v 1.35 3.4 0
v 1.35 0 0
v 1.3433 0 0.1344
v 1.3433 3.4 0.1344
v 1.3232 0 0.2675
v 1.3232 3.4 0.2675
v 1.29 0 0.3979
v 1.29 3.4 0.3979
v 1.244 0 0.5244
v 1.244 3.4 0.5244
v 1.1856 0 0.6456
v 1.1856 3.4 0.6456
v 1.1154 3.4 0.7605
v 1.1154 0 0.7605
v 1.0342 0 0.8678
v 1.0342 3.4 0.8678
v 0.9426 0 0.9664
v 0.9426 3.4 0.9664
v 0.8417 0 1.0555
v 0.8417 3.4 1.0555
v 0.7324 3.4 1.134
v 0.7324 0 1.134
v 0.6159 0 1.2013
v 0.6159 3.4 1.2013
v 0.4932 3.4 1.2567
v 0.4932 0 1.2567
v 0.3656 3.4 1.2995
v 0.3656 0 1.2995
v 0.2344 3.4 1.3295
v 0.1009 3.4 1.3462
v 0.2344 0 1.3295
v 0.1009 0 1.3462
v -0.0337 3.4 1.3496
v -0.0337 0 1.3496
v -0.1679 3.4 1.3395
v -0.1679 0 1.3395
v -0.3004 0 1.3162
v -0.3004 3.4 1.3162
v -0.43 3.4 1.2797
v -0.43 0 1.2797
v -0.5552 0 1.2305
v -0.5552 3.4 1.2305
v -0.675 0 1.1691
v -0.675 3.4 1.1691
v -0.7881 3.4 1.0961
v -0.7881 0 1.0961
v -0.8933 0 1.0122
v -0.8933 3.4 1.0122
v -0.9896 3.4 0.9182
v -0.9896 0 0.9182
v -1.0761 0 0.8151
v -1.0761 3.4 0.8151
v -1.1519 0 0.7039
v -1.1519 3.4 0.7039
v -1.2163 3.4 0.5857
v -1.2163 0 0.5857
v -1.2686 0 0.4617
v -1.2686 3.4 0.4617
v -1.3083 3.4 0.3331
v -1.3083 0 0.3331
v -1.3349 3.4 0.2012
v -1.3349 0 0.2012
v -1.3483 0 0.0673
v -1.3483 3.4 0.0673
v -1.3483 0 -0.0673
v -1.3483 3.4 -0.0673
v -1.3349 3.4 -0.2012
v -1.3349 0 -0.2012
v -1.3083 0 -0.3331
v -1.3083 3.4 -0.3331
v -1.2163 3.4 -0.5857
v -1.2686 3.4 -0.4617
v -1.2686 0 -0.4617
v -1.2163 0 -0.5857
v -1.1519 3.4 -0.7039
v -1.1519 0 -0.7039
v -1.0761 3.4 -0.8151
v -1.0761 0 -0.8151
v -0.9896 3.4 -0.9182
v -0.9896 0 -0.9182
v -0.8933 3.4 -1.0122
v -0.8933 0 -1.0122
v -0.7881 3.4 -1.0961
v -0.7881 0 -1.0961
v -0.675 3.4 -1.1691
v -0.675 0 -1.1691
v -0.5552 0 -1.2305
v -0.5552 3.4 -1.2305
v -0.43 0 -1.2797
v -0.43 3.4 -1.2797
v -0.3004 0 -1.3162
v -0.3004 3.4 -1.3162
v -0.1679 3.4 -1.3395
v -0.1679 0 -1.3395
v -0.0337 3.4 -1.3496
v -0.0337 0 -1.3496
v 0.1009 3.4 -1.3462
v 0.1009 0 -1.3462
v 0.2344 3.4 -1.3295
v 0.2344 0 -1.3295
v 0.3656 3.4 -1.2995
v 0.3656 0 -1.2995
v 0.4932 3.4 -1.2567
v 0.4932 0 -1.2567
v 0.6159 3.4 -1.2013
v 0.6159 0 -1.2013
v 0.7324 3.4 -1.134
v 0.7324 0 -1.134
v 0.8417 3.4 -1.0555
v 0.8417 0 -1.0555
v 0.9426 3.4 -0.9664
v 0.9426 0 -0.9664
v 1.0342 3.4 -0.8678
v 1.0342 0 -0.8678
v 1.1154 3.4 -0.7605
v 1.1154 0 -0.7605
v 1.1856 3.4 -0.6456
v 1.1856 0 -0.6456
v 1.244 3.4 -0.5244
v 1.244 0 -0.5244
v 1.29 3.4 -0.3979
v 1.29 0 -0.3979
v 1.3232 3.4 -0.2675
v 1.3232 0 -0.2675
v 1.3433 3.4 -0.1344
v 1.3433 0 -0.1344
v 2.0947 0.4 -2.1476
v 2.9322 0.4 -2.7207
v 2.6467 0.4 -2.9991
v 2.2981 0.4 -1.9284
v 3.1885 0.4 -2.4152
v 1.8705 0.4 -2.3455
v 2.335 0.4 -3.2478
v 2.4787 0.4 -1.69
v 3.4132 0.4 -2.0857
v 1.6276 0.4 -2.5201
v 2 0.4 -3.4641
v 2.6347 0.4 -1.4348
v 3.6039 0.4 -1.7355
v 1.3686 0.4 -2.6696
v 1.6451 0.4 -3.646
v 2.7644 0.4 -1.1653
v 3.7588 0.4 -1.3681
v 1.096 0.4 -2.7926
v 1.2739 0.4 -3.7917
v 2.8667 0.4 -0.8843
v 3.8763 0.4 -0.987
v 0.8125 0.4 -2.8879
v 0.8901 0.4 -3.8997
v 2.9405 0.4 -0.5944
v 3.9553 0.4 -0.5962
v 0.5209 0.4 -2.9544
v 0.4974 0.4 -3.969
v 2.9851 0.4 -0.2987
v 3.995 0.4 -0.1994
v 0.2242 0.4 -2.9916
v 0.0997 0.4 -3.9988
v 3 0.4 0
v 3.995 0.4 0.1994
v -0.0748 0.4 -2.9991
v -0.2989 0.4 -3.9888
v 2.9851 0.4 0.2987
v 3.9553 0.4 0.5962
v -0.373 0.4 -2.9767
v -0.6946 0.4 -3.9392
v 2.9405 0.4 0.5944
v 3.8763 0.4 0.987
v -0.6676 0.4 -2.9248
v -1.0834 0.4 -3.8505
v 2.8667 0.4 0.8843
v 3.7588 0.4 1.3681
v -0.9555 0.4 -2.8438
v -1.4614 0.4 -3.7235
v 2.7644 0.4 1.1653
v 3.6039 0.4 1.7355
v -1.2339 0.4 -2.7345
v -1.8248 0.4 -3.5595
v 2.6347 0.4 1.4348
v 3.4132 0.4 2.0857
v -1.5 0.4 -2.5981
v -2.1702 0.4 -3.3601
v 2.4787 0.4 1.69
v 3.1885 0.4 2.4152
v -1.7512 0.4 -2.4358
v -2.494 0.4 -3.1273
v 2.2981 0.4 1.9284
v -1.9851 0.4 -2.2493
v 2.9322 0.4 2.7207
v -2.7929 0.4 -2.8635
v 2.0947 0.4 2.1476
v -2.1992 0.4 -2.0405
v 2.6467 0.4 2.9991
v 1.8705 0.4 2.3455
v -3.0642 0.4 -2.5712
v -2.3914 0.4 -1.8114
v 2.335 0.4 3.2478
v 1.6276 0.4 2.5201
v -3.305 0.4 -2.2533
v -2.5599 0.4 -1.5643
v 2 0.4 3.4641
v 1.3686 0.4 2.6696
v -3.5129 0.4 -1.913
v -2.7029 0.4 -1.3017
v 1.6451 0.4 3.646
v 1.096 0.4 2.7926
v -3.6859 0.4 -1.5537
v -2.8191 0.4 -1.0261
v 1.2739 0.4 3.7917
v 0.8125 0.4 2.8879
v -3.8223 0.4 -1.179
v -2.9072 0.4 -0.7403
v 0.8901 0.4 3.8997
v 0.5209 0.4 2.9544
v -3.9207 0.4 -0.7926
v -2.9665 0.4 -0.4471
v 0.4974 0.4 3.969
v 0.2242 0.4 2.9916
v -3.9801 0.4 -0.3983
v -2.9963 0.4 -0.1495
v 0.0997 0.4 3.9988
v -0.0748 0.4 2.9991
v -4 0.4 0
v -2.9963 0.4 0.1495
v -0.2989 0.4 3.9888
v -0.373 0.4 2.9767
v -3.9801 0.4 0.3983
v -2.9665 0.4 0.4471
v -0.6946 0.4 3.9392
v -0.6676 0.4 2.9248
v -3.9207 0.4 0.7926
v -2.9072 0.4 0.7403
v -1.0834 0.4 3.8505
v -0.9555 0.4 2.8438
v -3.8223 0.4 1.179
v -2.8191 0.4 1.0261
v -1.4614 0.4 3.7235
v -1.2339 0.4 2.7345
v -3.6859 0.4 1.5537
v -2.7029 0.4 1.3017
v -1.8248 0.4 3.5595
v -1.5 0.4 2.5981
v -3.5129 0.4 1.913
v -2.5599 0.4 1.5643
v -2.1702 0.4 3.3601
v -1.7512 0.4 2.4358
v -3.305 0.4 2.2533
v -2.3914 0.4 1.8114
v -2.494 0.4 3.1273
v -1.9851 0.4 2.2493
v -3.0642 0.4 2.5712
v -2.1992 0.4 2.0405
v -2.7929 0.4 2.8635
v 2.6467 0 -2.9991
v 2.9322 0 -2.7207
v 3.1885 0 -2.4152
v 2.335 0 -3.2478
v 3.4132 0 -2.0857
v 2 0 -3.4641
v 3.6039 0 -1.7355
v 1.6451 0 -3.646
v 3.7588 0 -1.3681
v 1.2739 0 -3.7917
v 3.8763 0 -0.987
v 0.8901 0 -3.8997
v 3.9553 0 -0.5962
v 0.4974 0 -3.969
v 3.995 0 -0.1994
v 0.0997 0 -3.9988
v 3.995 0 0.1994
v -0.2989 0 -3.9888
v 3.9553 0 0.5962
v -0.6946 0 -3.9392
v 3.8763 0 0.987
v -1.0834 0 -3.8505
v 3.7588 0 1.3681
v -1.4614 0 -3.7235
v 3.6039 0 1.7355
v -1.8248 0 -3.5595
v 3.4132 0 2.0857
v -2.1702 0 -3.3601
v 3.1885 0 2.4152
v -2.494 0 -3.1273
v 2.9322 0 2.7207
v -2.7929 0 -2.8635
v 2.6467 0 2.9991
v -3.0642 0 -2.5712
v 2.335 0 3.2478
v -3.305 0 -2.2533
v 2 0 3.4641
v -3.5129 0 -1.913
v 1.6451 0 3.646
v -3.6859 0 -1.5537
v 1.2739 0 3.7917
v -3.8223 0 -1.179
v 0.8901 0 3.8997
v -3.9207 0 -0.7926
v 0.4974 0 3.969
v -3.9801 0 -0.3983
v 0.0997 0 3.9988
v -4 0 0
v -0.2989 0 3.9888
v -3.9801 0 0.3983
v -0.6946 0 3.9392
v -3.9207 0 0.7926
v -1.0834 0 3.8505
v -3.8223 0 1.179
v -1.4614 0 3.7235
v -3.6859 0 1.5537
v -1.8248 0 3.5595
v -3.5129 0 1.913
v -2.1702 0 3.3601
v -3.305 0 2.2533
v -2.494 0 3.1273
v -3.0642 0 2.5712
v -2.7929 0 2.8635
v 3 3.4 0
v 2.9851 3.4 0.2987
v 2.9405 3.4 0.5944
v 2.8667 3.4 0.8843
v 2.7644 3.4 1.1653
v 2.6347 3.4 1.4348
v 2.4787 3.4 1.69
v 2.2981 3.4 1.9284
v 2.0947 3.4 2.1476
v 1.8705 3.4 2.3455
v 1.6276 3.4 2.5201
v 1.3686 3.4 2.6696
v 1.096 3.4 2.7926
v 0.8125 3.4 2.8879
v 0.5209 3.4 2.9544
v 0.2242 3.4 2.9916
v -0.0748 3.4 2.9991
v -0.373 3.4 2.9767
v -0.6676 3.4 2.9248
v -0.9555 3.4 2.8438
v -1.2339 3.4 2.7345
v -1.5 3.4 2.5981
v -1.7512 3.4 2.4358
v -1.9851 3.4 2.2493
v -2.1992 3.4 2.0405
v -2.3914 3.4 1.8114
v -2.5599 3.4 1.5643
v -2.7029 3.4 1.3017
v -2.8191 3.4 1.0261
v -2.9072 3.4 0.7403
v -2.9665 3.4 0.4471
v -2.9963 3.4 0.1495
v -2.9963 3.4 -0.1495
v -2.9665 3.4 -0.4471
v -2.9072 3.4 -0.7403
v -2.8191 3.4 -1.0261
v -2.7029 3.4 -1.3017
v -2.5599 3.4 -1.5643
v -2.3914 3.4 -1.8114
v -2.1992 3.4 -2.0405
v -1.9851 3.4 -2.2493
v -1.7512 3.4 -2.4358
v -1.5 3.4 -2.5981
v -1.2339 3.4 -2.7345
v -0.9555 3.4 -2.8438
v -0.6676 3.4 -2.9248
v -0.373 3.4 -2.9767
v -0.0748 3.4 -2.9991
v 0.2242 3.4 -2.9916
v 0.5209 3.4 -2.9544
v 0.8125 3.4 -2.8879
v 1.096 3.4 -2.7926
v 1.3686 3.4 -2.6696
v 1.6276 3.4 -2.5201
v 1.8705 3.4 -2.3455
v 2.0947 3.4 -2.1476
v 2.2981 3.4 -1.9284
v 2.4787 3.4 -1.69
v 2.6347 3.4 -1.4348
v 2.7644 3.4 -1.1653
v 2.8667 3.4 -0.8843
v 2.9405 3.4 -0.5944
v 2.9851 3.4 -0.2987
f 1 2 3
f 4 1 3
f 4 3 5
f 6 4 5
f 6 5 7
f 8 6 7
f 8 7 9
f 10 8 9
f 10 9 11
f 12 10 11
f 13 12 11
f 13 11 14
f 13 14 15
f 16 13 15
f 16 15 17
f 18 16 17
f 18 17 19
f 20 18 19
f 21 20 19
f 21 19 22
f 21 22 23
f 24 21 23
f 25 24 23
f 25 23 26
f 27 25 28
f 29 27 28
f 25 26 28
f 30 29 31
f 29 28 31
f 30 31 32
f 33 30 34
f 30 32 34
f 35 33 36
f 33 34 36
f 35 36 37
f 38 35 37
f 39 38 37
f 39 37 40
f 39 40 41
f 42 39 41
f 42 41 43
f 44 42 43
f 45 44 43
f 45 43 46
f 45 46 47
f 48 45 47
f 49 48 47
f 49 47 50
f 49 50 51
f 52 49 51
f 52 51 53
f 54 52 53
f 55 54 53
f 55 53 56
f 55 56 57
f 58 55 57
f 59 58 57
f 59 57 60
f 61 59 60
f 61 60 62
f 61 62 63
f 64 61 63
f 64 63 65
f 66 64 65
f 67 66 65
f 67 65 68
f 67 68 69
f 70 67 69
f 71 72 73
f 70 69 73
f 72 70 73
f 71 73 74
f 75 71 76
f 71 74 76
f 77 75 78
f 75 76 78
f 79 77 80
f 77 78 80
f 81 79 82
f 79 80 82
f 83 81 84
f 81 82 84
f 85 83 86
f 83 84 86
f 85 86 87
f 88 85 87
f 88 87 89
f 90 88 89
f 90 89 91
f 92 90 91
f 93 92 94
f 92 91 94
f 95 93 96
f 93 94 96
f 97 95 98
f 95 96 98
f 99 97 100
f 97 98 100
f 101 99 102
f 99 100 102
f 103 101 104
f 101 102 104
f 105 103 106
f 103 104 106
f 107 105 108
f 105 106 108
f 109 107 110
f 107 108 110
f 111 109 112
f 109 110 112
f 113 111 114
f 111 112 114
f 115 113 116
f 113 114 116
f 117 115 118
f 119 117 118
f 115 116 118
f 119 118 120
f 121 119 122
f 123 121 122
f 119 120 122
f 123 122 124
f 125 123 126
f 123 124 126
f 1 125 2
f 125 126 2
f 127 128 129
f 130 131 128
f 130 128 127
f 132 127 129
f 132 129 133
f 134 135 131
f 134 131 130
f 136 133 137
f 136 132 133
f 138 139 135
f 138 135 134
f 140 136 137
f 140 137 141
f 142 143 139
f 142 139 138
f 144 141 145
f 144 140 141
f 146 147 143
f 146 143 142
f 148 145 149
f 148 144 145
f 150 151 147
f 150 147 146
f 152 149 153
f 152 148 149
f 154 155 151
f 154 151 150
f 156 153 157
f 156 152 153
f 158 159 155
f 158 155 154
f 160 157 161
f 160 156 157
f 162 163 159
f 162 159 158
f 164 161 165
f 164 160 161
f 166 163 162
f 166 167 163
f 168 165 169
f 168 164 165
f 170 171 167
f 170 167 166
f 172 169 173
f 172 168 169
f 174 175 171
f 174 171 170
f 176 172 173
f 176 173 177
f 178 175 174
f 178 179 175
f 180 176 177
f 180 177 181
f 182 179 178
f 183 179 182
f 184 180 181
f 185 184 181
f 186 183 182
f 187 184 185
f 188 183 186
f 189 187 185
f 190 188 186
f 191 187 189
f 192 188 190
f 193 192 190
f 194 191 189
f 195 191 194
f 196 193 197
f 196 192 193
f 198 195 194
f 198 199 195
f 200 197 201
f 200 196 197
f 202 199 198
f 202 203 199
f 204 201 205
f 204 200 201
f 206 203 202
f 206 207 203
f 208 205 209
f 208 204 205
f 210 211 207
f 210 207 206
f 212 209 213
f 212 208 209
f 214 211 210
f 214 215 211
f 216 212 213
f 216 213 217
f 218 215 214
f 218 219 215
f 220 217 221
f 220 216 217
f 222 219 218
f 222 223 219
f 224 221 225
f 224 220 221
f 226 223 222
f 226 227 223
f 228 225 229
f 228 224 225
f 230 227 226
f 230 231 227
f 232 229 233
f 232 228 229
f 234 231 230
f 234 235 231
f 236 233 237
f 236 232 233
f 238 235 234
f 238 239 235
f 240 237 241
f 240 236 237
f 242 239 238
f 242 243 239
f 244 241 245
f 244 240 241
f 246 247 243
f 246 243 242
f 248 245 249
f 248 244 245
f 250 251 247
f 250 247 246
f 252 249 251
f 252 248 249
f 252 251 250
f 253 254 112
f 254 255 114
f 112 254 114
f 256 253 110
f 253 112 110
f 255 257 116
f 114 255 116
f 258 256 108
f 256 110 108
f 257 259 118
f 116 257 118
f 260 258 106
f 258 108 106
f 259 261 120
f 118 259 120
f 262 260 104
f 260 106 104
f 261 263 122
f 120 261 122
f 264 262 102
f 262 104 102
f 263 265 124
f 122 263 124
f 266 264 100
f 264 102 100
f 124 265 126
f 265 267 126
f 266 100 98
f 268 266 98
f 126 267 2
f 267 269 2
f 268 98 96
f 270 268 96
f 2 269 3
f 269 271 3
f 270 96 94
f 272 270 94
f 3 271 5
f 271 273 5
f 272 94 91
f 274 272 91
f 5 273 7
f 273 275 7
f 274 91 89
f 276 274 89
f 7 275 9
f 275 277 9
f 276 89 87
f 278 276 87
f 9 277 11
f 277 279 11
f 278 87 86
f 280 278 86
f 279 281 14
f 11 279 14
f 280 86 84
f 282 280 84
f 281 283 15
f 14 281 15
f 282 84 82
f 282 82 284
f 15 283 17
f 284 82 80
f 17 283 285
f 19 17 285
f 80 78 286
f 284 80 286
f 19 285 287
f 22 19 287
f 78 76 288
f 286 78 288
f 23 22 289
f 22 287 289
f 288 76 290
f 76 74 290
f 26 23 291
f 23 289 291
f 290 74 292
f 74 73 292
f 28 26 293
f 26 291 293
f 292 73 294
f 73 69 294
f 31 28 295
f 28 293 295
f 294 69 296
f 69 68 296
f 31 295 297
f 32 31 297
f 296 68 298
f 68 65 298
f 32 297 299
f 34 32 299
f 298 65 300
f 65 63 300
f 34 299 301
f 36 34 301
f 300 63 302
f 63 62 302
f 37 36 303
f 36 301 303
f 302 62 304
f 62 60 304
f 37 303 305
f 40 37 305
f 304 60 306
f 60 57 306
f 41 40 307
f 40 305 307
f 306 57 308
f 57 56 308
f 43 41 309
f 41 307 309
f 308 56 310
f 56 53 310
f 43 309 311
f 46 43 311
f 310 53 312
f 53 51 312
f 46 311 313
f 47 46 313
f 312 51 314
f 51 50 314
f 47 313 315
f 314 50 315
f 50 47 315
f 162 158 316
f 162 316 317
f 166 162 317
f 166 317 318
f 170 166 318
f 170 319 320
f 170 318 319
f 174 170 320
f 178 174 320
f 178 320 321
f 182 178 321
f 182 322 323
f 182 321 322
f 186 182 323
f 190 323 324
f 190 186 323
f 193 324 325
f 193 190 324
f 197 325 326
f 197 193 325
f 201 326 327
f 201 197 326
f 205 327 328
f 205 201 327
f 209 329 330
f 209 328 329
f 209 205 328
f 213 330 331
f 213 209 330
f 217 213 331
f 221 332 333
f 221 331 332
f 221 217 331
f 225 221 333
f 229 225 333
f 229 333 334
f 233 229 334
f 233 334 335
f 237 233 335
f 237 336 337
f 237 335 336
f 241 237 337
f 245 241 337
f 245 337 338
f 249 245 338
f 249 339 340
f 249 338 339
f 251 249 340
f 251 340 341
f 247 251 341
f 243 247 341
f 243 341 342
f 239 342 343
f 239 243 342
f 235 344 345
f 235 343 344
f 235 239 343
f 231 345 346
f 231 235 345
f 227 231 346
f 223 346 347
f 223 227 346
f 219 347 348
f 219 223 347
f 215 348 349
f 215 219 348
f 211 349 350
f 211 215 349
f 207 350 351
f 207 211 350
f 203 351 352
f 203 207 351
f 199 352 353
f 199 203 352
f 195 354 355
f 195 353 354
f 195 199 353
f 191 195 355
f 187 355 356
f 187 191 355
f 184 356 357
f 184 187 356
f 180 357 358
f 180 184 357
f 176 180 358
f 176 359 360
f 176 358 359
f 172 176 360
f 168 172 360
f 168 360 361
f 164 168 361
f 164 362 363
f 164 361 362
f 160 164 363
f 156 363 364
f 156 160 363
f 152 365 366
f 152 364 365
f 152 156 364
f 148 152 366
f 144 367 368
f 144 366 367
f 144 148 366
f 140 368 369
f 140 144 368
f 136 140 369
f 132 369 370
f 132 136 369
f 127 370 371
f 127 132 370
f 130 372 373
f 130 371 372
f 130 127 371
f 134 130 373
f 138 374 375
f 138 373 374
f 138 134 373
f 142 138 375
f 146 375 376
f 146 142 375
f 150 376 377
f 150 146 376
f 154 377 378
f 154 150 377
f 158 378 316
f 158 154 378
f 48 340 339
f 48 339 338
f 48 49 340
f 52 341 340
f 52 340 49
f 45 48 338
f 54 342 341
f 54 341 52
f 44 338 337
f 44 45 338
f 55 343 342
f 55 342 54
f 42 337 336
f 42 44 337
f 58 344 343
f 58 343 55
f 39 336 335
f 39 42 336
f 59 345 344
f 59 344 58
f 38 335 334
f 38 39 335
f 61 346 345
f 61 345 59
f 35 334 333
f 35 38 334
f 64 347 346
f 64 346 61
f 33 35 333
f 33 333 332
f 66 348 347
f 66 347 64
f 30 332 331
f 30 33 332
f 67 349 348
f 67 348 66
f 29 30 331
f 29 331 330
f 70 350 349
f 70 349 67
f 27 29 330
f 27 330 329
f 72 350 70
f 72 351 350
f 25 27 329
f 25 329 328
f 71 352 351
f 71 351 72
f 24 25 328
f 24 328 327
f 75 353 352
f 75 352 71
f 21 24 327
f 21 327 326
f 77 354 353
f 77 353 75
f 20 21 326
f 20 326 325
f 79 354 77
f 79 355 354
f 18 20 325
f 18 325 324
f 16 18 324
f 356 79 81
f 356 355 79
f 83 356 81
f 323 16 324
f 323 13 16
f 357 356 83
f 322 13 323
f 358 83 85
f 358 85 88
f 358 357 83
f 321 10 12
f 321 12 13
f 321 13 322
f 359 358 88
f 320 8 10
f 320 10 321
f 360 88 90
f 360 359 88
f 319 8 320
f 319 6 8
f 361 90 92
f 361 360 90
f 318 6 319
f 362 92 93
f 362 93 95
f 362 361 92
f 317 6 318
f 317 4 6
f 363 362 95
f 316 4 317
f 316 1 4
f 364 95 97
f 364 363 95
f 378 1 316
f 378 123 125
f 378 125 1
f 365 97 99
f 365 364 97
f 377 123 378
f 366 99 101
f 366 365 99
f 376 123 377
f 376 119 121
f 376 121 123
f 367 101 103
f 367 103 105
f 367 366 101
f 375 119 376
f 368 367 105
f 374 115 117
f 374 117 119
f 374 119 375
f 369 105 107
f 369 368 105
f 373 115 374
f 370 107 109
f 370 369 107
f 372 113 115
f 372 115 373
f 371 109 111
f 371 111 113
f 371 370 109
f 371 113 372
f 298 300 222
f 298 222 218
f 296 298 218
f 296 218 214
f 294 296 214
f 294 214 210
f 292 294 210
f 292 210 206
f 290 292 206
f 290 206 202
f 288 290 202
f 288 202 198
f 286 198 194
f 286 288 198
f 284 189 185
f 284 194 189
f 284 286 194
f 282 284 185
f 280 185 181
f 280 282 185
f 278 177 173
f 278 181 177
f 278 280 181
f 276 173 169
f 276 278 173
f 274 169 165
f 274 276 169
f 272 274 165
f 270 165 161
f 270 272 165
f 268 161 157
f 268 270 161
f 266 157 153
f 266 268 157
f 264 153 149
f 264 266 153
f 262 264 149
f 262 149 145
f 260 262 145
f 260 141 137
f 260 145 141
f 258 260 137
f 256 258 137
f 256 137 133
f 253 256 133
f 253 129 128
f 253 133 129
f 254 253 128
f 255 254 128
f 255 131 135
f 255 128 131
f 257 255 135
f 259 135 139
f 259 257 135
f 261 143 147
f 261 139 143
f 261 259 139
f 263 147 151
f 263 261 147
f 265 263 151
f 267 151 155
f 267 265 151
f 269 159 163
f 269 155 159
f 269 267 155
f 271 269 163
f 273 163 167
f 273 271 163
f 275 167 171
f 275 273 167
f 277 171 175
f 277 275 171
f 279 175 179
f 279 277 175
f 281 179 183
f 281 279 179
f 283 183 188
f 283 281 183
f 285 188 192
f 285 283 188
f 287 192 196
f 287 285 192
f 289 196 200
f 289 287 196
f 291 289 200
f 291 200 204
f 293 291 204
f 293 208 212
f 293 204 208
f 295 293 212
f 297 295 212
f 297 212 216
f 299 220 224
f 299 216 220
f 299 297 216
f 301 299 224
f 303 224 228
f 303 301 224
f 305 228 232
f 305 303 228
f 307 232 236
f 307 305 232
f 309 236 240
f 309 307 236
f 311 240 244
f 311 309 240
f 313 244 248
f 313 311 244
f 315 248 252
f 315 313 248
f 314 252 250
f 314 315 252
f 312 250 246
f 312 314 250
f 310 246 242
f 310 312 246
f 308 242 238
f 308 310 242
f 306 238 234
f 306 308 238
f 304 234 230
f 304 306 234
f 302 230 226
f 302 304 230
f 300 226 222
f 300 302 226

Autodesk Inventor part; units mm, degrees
ref_plane "YZ Plane" through (0, 0, 0) normal (1, 0, 0) x (0, 1, 0)
ref_plane "XZ Plane" through (0, 0, 0) normal (0, 1, 0) x (-1, 0, 0)
ref_plane "XY Plane" through (0, 0, 0) normal (0, 0, 1) x (1, 0, 0)
sketch "スケッチ1" plane through (0, 0, 0) normal (0, 1, 0) x (-1, 0, 0)
  circle A0 centre (0, 0) radius 4
  dimension "d0" = 8
extrude "押し出し1" add sketch "スケッチ1" along normal blind 0.4
sketch "スケッチ2" plane through (0, 0.4, 0) normal (0, 1, 0) x (1, 0, 0)
  circle A0 centre (0, 0) radius 3
  dimension "d3" = 6
extrude "押し出し2" add sketch "スケッチ2" along normal blind 3
sketch "スケッチ3" plane through (0, 0, 0) normal (0, -1, 0) x (1, 0, 0)
  circle A0 centre (0, 0) radius 1.35
  dimension "d6" = 2.7
extrude "押し出し3" cut sketch "スケッチ3" against normal through all
properties part number "screw_bearing_setter"
